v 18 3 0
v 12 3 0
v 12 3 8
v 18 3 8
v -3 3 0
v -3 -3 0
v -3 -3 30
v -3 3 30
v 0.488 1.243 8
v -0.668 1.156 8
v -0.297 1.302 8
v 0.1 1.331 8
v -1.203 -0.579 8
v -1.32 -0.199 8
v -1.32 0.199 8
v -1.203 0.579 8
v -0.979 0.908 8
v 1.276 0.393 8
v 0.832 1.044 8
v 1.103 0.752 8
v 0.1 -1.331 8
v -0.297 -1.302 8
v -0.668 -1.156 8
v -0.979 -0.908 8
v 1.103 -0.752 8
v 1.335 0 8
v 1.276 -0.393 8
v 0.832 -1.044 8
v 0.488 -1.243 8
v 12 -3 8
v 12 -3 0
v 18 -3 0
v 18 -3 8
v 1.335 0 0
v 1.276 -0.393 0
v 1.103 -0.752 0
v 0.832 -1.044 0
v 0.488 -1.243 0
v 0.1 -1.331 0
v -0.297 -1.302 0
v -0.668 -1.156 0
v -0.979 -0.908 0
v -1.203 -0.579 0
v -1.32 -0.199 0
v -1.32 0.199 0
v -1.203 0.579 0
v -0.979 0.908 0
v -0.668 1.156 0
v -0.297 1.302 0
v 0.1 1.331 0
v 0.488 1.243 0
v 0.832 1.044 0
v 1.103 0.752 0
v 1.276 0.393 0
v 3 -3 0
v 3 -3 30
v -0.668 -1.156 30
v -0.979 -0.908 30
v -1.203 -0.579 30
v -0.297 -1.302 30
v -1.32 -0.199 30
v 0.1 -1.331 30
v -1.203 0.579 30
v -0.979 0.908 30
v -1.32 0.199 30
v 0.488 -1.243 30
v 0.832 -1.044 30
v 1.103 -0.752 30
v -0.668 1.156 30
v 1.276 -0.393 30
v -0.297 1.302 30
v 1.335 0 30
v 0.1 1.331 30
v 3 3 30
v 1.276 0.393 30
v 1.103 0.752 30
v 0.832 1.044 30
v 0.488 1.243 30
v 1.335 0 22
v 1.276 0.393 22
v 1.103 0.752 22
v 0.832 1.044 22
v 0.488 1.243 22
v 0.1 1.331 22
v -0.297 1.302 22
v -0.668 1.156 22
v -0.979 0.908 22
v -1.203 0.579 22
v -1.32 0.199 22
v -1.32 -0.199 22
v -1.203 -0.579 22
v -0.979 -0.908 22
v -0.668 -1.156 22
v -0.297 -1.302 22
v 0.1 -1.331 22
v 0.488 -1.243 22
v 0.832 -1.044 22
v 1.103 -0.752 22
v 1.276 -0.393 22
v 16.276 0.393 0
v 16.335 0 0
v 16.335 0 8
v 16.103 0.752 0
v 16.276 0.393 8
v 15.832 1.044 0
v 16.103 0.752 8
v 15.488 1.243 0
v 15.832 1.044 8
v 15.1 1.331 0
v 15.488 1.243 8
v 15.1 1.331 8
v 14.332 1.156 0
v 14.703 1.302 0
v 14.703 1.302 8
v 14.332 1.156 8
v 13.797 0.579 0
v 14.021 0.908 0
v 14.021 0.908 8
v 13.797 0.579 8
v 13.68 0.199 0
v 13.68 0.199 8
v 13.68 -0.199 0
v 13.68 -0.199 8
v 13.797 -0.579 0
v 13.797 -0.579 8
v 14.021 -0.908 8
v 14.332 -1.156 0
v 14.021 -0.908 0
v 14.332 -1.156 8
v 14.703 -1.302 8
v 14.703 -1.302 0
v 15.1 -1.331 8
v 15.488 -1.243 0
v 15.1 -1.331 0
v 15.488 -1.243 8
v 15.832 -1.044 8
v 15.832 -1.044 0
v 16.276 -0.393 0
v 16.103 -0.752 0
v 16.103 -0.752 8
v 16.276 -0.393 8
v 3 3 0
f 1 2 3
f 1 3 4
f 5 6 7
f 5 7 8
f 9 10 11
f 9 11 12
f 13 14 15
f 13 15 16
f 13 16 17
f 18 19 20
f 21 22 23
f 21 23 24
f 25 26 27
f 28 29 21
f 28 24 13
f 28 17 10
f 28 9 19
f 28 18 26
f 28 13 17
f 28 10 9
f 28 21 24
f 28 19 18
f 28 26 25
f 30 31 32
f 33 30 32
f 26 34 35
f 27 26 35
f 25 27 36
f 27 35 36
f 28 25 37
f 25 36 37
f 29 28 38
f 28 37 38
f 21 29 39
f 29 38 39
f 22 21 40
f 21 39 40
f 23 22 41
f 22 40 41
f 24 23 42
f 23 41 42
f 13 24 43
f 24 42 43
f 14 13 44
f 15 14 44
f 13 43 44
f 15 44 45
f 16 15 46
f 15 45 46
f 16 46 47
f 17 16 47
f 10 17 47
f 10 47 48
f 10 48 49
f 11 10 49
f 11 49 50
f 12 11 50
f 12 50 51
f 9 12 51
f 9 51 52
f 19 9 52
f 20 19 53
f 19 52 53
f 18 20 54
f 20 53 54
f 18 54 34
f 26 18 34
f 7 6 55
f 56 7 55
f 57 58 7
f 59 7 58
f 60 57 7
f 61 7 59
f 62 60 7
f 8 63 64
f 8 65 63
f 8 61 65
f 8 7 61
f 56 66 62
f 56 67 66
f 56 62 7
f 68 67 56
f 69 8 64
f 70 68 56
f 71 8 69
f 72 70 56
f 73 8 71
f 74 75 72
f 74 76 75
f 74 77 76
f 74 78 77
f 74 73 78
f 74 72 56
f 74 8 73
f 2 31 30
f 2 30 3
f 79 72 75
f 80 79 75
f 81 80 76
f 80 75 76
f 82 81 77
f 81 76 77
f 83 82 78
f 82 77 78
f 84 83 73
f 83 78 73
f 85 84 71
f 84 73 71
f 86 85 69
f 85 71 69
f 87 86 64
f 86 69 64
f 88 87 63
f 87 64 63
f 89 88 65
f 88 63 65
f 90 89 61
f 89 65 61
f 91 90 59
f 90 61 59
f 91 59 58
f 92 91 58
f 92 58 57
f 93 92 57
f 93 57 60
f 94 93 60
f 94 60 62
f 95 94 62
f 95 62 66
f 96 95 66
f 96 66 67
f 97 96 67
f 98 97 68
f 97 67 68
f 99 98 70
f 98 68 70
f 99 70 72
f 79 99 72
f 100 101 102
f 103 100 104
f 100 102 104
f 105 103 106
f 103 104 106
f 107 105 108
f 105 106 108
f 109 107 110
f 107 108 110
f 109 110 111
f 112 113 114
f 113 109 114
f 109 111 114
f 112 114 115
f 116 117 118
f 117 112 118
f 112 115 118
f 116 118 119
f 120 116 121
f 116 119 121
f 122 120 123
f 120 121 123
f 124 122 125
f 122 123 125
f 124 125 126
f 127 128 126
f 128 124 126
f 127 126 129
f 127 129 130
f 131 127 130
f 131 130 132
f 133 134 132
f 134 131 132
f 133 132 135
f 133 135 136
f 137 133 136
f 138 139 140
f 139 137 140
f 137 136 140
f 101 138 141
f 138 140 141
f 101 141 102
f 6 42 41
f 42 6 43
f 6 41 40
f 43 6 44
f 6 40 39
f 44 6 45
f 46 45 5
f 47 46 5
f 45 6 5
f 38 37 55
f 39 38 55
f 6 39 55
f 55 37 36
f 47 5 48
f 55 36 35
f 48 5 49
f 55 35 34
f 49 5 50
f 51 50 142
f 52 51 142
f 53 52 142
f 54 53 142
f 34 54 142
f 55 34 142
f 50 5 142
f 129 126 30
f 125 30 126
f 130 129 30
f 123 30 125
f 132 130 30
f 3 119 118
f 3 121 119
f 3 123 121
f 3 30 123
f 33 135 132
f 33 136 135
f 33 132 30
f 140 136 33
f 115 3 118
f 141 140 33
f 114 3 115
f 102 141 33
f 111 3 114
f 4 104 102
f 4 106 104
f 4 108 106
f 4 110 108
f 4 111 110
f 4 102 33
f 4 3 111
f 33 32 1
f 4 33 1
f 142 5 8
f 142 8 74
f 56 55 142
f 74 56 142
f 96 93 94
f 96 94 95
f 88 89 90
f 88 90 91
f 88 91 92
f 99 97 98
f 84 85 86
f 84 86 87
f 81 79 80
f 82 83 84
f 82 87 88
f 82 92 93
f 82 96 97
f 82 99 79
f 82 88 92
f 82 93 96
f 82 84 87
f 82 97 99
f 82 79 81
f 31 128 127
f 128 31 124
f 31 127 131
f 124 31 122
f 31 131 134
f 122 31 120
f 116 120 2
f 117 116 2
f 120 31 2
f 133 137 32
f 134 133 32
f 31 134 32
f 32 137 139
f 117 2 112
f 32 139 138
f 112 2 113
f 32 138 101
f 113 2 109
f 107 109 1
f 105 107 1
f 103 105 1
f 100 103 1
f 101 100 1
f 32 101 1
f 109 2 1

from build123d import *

# Parameters (mm, degrees)
F0_W     = 6
F0_H     = 6
F1_DEPTH = 30
F2_R     = 1.335
F3_DEPTH = 8
F4_R     = 1.335
F5_DEPTH = 8
F6_DEPTH = 8
F7_R     = 1.335
F8_R     = 1.335
F9_DEPTH = 8.001


with BuildPart() as f1:
    # F0 (on Top) → F1 (new body)
    with BuildSketch(Plane.XY):
        Rectangle(F0_W, F0_H)
    extrude(amount=F1_DEPTH)

    # F2 (on face) → F3 (cut)
    with BuildSketch(Plane.XY.offset(30)):
        Circle(F2_R)
    extrude(amount=-F3_DEPTH, mode=Mode.SUBTRACT)

    # F4 (on face) → F5 (cut)
    with BuildSketch(Plane(origin=(0, 0, 0), x_dir=(1, 0, 0), z_dir=(0, 0, -1))):
        Circle(F4_R)
    extrude(amount=-F5_DEPTH, mode=Mode.SUBTRACT)


with BuildPart() as f6:
    # F0 (on Top) → F6 (new body)
    with BuildSketch(Plane.XY):
        with Locations((15, 0)):
            Rectangle(F0_W, F0_H)
    extrude(amount=F6_DEPTH)

    # F7 (on face) + F8 (on face) → F9 (cut, through all)
    with BuildSketch(Plane.XY.offset(8)):
        with Locations((15, 0)):
            Circle(F7_R)
    with BuildSketch(Plane(origin=(0, 0, 0), x_dir=(1, 0, 0), z_dir=(0, 0, -1))):
        with Locations((15, 0)):
            Circle(F8_R)
    extrude(amount=-F9_DEPTH, mode=Mode.SUBTRACT)


solid = Compound([f1.part, f6.part])
